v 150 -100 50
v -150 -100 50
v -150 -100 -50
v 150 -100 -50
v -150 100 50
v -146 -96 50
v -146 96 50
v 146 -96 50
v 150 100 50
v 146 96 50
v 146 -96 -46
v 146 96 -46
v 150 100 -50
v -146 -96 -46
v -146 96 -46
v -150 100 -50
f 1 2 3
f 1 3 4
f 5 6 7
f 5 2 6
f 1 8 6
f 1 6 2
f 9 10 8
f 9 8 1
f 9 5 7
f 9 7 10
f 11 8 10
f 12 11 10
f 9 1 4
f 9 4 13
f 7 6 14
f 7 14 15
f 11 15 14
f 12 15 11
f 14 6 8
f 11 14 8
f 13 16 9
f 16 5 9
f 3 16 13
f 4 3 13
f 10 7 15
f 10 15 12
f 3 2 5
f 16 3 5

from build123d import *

# Parameters (mm, degrees)
F0_W     = 300
F0_H     = 200
F1_DEPTH = 50
F2_T     = -4


with BuildPart() as f1:
    # F0 (on Top) → F1 (new body, symmetric)
    with BuildSketch(Plane.XY):
        Rectangle(F0_W, F0_H)
    extrude(amount=F1_DEPTH, both=True)

    # F2
    f2_openings = [f1.faces().sort_by_distance(p)[0] for p in [
        (0, 0, 50),
    ]]
    offset(amount=F2_T, openings=f2_openings)


solid = f1.part
